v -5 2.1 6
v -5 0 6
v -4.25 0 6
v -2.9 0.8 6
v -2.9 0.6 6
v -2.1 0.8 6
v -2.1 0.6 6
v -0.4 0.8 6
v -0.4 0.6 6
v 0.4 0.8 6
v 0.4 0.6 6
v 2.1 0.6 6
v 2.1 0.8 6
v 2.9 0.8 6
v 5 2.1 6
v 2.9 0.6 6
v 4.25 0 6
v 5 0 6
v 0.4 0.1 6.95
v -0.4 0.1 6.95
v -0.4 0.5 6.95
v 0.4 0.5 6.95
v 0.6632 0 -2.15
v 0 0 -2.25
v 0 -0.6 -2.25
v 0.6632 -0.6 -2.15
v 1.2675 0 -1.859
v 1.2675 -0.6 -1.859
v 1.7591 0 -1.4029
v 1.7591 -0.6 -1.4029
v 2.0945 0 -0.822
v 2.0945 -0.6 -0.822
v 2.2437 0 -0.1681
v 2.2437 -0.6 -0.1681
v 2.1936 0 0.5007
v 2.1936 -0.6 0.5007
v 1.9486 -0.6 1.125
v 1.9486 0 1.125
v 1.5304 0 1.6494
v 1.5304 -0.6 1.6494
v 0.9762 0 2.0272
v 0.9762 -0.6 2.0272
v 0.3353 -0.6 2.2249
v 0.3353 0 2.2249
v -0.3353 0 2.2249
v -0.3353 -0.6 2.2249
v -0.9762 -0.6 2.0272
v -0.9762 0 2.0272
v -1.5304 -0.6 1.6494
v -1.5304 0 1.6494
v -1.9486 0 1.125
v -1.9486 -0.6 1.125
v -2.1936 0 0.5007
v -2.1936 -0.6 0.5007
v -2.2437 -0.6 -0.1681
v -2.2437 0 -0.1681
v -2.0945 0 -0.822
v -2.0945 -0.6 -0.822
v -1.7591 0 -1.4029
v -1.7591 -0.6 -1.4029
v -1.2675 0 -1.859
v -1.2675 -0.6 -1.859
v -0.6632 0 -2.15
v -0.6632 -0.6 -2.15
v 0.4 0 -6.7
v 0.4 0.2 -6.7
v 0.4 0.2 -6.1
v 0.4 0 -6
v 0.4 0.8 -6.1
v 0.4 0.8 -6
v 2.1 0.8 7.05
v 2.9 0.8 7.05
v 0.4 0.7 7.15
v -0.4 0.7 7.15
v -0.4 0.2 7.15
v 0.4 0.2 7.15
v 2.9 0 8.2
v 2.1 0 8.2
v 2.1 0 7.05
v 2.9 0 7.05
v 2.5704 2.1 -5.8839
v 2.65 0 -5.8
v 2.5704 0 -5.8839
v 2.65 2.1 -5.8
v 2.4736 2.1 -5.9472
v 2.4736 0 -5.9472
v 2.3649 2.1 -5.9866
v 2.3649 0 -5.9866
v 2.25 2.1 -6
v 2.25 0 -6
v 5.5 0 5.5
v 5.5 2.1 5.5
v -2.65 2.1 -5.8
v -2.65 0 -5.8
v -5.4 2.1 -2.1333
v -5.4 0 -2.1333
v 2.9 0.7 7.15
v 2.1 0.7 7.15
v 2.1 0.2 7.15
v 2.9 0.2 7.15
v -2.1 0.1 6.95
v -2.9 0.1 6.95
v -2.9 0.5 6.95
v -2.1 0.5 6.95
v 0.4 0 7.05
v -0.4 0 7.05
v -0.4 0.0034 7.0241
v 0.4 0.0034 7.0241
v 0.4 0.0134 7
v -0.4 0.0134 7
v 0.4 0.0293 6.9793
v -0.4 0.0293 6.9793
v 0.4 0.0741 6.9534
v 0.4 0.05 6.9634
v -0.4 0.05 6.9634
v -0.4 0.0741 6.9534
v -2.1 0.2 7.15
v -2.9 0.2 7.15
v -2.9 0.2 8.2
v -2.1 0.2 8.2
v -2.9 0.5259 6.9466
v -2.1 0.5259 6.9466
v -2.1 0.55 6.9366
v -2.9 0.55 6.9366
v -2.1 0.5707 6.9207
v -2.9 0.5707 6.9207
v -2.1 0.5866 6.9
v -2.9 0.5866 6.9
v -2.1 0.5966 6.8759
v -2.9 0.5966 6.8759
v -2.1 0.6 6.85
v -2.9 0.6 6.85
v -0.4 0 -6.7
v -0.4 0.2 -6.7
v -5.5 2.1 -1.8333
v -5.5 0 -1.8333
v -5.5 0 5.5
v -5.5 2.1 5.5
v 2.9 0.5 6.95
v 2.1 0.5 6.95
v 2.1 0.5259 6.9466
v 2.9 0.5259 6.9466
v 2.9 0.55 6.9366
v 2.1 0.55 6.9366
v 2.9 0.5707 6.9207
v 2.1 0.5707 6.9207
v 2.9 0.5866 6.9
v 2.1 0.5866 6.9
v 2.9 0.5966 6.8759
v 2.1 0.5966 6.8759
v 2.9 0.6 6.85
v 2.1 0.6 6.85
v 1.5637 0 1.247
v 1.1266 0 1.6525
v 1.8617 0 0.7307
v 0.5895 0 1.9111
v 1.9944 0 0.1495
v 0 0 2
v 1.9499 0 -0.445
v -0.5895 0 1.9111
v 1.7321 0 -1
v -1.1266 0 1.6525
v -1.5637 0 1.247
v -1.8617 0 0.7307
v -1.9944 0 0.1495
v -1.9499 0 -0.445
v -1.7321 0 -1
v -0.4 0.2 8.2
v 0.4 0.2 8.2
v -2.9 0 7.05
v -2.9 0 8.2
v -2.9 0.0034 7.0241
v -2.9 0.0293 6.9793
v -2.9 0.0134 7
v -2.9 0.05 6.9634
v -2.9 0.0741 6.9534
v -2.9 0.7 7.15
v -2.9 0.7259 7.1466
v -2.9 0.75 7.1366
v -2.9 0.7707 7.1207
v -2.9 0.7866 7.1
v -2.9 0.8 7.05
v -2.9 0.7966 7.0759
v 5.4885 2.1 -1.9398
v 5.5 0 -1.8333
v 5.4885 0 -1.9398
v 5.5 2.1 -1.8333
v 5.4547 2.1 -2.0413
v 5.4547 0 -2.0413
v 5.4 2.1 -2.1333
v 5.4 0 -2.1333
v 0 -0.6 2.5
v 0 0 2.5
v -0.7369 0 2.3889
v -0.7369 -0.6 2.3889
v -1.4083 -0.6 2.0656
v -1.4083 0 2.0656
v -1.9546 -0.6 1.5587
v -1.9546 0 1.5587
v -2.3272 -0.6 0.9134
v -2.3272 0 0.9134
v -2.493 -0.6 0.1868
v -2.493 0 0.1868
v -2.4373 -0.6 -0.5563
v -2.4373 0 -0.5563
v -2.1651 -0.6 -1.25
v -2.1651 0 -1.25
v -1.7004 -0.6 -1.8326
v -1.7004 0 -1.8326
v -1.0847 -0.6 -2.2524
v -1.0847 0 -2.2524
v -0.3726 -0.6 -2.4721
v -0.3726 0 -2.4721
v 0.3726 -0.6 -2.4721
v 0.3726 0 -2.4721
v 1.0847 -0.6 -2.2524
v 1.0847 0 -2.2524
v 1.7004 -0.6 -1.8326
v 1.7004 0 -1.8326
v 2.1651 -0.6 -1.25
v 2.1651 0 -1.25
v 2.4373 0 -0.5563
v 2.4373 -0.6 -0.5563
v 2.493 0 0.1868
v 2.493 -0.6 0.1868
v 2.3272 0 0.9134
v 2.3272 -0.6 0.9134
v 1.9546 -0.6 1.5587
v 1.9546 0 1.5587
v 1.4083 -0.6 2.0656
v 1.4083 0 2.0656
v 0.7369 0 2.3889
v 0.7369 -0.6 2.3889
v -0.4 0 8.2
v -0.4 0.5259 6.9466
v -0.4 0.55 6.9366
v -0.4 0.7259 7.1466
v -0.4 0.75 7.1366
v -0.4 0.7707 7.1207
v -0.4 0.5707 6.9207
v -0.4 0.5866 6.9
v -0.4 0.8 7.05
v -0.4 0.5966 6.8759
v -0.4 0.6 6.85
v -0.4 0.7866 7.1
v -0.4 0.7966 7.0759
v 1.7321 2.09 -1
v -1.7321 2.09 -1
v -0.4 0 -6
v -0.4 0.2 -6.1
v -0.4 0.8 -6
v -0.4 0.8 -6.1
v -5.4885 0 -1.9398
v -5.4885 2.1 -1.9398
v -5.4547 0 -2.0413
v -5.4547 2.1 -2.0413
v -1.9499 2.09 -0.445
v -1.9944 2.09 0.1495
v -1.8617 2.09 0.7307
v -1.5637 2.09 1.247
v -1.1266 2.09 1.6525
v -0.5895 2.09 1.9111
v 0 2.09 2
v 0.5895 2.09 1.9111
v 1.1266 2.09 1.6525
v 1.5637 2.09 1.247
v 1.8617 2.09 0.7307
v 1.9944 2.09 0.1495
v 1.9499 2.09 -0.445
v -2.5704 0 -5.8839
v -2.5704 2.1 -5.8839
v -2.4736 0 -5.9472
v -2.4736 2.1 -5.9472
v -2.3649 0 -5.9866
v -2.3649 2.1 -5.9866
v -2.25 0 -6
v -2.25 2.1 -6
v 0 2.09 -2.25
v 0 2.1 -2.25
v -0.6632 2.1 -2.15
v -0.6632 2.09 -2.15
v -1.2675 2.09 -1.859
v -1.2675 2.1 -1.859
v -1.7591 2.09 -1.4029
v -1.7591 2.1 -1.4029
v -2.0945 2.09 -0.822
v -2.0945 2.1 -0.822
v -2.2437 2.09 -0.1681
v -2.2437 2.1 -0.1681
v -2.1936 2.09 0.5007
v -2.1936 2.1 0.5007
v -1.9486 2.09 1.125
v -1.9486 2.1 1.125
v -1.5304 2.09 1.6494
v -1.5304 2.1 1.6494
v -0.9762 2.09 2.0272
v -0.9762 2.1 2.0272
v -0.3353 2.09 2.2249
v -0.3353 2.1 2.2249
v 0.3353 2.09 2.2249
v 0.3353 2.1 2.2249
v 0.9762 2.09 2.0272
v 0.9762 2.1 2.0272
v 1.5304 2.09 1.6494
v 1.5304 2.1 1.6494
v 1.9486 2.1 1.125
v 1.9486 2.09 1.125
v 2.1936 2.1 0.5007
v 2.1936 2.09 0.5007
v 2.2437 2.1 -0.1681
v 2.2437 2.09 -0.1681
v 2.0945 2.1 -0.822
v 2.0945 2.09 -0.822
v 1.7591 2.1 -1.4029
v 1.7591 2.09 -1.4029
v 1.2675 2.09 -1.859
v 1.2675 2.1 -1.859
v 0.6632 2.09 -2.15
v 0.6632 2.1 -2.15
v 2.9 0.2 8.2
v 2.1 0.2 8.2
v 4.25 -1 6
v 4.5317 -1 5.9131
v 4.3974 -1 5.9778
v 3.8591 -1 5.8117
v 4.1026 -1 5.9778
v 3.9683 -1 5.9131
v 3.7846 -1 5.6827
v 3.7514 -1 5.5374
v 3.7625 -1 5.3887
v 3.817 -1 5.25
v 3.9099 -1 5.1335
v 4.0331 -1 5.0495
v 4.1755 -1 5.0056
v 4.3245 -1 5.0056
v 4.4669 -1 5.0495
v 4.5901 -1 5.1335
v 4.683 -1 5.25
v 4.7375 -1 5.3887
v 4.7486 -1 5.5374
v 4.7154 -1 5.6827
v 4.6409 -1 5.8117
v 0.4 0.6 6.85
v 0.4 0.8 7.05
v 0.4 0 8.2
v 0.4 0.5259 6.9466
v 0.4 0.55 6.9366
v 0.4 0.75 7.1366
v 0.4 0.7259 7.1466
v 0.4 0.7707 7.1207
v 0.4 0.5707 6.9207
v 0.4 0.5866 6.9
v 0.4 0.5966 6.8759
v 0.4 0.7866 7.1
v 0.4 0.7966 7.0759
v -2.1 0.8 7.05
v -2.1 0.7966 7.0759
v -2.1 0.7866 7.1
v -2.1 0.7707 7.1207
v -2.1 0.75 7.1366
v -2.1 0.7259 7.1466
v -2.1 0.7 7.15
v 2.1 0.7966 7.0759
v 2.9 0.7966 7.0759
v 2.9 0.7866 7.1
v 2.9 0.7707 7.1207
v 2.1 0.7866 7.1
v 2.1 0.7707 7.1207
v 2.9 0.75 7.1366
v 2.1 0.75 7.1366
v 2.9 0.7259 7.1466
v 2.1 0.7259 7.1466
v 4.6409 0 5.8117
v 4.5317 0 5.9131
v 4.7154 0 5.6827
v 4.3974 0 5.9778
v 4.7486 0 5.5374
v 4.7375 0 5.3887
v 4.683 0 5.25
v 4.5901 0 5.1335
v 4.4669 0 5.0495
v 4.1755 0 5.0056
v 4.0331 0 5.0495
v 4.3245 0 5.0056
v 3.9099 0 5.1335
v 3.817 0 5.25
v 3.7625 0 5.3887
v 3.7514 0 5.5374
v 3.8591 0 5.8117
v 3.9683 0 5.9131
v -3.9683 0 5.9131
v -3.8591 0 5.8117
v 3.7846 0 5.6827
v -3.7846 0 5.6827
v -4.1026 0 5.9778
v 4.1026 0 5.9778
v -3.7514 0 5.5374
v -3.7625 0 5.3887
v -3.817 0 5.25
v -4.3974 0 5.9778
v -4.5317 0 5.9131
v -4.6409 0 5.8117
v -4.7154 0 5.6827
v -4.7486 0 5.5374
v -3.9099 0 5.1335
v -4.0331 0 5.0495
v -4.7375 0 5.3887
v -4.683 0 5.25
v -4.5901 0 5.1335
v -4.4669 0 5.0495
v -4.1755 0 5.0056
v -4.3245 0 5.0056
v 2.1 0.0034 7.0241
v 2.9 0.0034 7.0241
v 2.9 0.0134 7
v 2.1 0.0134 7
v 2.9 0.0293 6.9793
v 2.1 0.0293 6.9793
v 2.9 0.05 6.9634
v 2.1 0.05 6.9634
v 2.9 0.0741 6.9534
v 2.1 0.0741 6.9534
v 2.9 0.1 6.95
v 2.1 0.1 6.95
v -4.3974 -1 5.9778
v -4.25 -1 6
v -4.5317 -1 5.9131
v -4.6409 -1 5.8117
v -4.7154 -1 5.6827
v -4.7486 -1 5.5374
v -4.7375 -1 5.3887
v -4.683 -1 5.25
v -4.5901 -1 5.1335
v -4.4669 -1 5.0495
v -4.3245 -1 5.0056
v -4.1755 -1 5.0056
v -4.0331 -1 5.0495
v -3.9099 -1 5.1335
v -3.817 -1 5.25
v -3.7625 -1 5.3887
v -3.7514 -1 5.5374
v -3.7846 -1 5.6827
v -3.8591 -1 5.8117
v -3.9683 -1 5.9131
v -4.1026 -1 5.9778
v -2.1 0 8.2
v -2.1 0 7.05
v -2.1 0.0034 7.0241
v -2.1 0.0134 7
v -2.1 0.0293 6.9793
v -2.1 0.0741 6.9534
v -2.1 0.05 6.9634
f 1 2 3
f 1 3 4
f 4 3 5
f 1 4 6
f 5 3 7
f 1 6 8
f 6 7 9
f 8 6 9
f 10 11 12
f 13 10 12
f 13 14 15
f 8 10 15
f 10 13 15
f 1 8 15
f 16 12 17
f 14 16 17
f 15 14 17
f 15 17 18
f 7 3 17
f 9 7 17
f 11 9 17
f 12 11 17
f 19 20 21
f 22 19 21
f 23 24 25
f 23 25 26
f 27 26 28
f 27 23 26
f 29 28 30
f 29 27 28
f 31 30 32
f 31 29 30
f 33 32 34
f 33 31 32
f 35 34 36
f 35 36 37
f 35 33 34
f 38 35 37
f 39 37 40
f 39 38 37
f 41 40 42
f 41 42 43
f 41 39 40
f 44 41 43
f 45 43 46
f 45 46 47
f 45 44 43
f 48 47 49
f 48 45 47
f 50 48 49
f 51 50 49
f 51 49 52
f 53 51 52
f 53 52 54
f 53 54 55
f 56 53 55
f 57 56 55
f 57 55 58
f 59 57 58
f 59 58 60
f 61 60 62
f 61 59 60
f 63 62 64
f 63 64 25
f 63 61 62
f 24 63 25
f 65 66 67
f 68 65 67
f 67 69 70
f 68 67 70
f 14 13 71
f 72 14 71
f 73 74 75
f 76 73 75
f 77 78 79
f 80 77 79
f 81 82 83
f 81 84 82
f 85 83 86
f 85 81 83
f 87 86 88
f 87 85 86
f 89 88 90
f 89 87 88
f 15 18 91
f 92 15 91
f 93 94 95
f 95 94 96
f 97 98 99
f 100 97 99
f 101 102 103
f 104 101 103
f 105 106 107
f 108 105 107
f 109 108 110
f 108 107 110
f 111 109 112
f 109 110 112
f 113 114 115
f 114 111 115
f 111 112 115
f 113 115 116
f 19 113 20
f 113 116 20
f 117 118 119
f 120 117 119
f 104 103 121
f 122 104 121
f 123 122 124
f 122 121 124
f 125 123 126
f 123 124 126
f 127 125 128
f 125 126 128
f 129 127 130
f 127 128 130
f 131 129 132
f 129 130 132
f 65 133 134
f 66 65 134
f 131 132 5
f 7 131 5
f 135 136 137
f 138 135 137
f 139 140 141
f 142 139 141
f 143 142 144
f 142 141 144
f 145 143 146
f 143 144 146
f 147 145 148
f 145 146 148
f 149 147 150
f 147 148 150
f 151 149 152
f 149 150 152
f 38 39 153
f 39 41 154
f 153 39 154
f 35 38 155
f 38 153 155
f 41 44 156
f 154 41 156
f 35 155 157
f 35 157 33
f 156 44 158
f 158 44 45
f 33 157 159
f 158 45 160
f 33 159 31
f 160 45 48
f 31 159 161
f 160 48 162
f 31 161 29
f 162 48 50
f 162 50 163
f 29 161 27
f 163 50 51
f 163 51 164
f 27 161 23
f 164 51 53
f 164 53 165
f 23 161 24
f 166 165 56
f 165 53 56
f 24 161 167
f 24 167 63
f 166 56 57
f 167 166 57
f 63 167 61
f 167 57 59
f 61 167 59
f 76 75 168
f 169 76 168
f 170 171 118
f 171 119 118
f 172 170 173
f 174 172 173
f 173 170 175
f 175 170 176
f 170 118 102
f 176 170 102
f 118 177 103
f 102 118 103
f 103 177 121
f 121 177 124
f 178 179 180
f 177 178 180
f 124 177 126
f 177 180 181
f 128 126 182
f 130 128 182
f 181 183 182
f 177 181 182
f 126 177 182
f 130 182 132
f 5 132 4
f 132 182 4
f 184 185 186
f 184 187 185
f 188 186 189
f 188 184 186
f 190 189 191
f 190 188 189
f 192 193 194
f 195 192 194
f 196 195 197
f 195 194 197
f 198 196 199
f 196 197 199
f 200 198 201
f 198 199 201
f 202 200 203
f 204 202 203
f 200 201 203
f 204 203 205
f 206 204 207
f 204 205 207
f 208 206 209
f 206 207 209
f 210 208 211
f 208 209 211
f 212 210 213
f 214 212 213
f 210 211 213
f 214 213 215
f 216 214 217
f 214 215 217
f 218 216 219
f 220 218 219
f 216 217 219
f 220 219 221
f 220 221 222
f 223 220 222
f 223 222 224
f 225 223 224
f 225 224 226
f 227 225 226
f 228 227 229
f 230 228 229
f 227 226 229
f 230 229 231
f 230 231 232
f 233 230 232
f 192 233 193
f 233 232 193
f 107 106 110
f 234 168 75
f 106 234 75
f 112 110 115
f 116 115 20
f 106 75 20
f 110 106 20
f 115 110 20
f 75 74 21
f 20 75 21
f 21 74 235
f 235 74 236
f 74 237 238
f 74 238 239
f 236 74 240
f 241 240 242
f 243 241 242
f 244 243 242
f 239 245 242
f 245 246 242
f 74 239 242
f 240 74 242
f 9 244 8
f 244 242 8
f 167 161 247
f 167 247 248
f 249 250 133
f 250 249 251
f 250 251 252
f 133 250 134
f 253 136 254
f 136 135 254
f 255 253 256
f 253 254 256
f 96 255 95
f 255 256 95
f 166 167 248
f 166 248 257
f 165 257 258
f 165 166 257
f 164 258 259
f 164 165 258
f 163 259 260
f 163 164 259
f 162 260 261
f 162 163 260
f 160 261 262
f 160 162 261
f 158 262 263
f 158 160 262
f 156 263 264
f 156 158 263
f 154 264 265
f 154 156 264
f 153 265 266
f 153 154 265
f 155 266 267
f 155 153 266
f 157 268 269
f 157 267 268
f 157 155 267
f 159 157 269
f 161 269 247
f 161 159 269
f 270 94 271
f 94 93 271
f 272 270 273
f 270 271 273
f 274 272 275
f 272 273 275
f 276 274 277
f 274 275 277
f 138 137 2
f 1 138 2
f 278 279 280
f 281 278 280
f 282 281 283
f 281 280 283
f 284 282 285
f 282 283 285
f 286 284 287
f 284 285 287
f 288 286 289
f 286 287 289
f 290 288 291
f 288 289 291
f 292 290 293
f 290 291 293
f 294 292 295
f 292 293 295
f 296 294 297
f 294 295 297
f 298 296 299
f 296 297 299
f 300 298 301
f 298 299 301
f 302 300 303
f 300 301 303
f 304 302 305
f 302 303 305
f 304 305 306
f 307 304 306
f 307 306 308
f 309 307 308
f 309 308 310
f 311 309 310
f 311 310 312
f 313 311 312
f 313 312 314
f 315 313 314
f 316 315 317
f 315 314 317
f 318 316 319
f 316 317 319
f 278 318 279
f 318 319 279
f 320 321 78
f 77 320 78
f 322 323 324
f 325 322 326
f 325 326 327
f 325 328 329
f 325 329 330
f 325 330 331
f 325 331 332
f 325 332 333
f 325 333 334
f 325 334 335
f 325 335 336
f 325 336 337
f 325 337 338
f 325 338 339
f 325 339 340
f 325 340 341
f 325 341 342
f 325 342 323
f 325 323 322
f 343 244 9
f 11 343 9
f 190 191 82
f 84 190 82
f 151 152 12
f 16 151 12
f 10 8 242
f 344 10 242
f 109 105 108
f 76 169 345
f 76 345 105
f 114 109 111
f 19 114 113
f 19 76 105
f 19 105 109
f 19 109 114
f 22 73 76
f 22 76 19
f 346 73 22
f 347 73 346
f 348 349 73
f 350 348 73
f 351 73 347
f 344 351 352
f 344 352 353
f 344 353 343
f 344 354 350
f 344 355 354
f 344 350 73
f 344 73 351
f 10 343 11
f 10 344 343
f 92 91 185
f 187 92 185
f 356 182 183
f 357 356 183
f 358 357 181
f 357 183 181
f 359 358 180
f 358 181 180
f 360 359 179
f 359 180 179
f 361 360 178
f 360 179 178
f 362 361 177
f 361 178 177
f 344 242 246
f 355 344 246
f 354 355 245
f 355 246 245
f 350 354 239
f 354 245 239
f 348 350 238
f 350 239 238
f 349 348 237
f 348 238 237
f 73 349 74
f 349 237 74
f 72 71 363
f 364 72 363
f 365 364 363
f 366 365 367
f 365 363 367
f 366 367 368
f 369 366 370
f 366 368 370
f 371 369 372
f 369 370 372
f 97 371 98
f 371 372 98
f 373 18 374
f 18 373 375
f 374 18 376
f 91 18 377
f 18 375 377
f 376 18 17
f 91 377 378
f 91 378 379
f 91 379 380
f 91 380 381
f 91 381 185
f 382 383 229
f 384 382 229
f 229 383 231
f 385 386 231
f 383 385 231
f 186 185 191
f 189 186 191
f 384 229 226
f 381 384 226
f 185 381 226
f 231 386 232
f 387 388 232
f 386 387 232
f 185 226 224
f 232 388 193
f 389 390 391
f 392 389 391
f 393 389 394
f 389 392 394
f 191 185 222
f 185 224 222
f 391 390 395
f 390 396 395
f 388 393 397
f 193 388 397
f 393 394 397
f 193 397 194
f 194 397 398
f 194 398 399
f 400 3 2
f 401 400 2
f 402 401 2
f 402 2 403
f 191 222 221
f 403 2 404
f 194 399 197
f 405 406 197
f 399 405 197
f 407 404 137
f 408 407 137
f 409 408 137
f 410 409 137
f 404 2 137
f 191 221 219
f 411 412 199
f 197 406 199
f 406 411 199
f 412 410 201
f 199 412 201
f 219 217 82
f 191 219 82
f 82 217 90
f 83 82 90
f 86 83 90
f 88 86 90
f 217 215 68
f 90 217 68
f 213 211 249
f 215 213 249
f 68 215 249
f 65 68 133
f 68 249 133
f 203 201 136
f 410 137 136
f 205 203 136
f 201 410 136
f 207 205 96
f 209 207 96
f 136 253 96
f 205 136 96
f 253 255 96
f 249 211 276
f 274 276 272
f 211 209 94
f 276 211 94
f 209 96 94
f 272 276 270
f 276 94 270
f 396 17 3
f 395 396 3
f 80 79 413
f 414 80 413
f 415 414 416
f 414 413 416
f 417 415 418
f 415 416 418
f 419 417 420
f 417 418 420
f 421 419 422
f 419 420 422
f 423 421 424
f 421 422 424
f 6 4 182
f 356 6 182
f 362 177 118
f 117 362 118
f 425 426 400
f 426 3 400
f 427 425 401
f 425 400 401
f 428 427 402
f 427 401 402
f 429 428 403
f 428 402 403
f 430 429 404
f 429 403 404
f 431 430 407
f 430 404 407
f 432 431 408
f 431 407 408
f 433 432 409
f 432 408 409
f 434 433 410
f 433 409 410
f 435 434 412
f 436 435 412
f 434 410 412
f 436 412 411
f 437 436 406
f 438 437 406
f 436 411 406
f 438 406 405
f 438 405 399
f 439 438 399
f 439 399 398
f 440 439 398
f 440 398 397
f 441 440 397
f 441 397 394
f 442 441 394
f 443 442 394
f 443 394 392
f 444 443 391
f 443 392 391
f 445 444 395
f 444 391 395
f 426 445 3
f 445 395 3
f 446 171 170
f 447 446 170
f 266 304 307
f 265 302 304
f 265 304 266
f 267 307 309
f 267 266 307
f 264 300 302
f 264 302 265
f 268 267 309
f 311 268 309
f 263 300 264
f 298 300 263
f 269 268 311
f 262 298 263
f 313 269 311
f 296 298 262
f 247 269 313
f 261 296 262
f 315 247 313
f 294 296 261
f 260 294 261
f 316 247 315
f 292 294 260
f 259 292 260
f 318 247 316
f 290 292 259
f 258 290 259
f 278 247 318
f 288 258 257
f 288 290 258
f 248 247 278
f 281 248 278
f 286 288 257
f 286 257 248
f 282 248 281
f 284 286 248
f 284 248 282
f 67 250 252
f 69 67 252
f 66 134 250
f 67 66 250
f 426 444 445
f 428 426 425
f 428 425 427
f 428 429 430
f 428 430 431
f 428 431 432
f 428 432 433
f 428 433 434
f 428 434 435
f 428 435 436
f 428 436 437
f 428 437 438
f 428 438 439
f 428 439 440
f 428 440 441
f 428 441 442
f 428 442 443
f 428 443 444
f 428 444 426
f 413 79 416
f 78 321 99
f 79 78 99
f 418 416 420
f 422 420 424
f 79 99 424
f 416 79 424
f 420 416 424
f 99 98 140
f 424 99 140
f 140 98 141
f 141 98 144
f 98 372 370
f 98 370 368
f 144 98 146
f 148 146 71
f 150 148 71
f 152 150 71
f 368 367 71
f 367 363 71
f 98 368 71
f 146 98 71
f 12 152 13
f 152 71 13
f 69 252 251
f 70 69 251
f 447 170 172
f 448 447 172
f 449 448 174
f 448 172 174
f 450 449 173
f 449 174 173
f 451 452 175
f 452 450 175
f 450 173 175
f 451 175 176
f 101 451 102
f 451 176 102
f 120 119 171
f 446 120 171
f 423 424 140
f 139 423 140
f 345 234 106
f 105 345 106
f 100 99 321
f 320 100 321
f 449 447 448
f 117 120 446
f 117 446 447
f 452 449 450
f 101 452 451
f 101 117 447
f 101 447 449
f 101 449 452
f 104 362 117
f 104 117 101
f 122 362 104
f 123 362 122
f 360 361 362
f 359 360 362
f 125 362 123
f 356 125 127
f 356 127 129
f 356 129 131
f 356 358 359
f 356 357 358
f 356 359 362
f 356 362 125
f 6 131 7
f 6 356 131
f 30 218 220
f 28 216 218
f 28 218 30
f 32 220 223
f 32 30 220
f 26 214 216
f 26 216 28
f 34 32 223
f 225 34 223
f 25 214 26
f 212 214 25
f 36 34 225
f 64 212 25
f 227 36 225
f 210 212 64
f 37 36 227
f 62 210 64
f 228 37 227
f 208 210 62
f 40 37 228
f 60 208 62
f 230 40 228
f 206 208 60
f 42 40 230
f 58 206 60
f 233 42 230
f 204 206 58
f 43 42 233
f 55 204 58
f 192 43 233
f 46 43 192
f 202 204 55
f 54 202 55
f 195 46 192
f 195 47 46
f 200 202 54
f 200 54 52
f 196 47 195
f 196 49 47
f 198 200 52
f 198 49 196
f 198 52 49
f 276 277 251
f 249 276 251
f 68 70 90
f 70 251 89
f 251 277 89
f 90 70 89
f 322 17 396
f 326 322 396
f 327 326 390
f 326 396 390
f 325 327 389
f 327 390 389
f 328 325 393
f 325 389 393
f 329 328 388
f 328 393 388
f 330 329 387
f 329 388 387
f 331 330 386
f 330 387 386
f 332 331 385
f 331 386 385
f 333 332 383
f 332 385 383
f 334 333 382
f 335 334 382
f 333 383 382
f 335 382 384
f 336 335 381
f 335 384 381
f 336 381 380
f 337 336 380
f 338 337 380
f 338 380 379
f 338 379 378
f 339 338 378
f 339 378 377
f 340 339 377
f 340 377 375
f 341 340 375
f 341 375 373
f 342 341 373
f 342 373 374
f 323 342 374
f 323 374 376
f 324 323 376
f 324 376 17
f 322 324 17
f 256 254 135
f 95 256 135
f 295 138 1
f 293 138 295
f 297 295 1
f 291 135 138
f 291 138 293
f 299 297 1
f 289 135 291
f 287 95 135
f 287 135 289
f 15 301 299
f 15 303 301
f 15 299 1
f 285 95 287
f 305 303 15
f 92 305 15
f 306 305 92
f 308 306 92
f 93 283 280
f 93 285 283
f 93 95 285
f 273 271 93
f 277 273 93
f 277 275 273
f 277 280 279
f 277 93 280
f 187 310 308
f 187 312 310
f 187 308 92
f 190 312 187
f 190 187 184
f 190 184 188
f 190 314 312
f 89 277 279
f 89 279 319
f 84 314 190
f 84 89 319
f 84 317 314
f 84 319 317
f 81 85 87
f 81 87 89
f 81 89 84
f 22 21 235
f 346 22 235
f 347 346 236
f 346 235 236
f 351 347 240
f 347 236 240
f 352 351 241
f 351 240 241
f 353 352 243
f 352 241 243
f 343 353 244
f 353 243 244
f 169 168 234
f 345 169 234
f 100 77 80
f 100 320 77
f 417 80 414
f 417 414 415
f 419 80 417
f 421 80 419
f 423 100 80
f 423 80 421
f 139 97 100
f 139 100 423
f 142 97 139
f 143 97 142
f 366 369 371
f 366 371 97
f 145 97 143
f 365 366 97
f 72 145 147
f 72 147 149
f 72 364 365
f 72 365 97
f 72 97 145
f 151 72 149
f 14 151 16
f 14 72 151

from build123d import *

# Parameters (mm, degrees)
SKETCH1_R                = 2.5
FORMABASE_DEPTH          = 2.1
FILLET1_R                = 0.5
BOSS_EXTRUDE2_DEPTH      = 2.9
BOSS_EXTRUDE2_DEPTH_BACK = 2.9
BOSS_EXTRUDE2_START      = -5.5
SKETCH3_W                = 1.7
SKETCH3_H                = 2.2
CUT_EXTRUDE1_DEPTH       = 11.094552987
SKETCH4_R                = 2.5
SKETCH4_R_2              = 2.25
SKETCH4_R_3              = 0.5
BOSS_EXTRUDE3_DEPTH      = 0.6
SKETCH5_R                = 0.5
BOSS_EXTRUDE4_DEPTH      = 0.4
SKETCH6_R                = 2.25
CUT_EXTRUDE2_DEPTH       = 0.01


with BuildPart() as part:
    # Sketch1 → FormaBase (new body)
    # profile 1 of 2: a face of its own
    with BuildSketch(Plane(origin=(0, 0, 0), x_dir=(1, 0, 0), z_dir=(0, 1, 0))):
        Polygon((-5, -6), (5, -6), (5.5, -5.5), (5.5, 2), (2.5, 6), (-2.5, 6), (-5.5, 2), (-5.5, -5.5), align=None)
        Circle(SKETCH1_R, mode=Mode.SUBTRACT)
    # profile 2 of 2: a face of its own
    with BuildSketch(Plane(origin=(0, 0, 0), x_dir=(1, 0, 0), z_dir=(0, 1, 0))):
        Circle(SKETCH1_R)
        with BuildLine():
            ThreePointArc((-1.732050808, 1), (0, -2), (1.732050808, 1))
            Line((1.732050808, 1), (-1.732050808, 1))
        make_face(mode=Mode.SUBTRACT)
    extrude(amount=FORMABASE_DEPTH)

    # Fillet1
    fillet1_edges = [part.edges().sort_by_distance(p)[0] for p in [
        (-5.5, 1.05, -2),
        (-2.5, 1.05, -6),
        (2.5, 1.05, -6),
        (5.5, 1.05, -2),
    ]]
    fillet(fillet1_edges, radius=FILLET1_R)

    # Sketch2 → Boss-Extrude2 (add, two sides: drawn at the far end of the back side and taken through both)
    with BuildSketch(Plane(origin=(5.5, 0, 0), x_dir=(0, 0, -1), z_dir=(1, 0, 0)).offset(BOSS_EXTRUDE2_START - BOSS_EXTRUDE2_DEPTH_BACK)):
        with BuildLine():
            Line((-8.2, 0), (-7.05, 0))
            ThreePointArc((-7.05, 0), (-6.979289322, 0.029289322), (-6.95, 0.1))
            Line((-6.95, 0.1), (-6.95, 0.5))
            ThreePointArc((-6.95, 0.5), (-6.920710678, 0.570710678), (-6.85, 0.6))
            Line((-6.85, 0.6), (-6, 0.6))
            Line((-6, 0.6), (-6, 0.8))
            Line((-6, 0.8), (-7.05, 0.8))
            ThreePointArc((-7.05, 0.8), (-7.120710678, 0.770710678), (-7.15, 0.7))
            Line((-7.15, 0.7), (-7.15, 0.2))
            Line((-7.15, 0.2), (-8.2, 0.2))
            Line((-8.2, 0.2), (-8.2, 0))
        make_face()
        Polygon((6, 0.8), (6, 0), (6.7, 0), (6.7, 0.2), (6.1, 0.2), (6.1, 0.8), align=None)
    extrude(amount=BOSS_EXTRUDE2_DEPTH + BOSS_EXTRUDE2_DEPTH_BACK)

    # Sketch3 → Cut-Extrude1 (cut, through all)
    with BuildSketch(Plane(origin=(0, 2.1, 0), x_dir=(1, 0, 0), z_dir=(0, 1, 0))):
        with Locations((-1.25, -7.1)):
            Rectangle(SKETCH3_W, SKETCH3_H)
        with Locations((1.25, -7.1)):
            Rectangle(SKETCH3_W, SKETCH3_H)
        Polygon((-2.1, 6), (-0.4, 6), (-0.4, 6.7), (-2.9, 6.7), (-2.9, 6), (-2.25, 6), align=None)
        Polygon((0.4, 6.7), (0.4, 6), (2.1, 6), (2.25, 6), (2.9, 6), (2.9, 6.7), align=None)
    extrude(amount=-CUT_EXTRUDE1_DEPTH, mode=Mode.SUBTRACT)

    # Sketch4 → Boss-Extrude3 (add)
    # profile 1 of 3: a face of its own
    with BuildSketch(Plane.XZ):
        with Locations(Location((0, 0, 0), (0, 0, 90))):
            Circle(SKETCH4_R)
        with Locations(Location((0, 0, 0), (0, 0, 270))):
            Circle(SKETCH4_R_2, mode=Mode.SUBTRACT)
    # profile 2 of 3: a face of its own
    with BuildSketch(Plane.XZ):
        with Locations(Location((4.25, 5.5, 0), (0, 0, 90))):
            Circle(SKETCH4_R_3)
    # profile 3 of 3: a face of its own
    with BuildSketch(Plane.XZ):
        with Locations(Location((-4.25, 5.5, 0), (0, 0, 90))):
            Circle(SKETCH4_R_3)
    extrude(amount=BOSS_EXTRUDE3_DEPTH)

    # Sketch5 → Boss-Extrude4 (add)
    with BuildSketch(Plane.XZ.offset(0.6)):
        with Locations(Location((-4.25, 5.5, 0), (0, 0, 90))):
            Circle(SKETCH5_R)
        with Locations(Location((4.25, 5.5, 0), (0, 0, 90))):
            Circle(SKETCH5_R)
    extrude(amount=BOSS_EXTRUDE4_DEPTH)

    # Sketch6 → Cut-Extrude2 (cut)
    with BuildSketch(Plane(origin=(0, 2.1, 0), x_dir=(1, 0, 0), z_dir=(0, 1, 0))):
        with Locations(Location((0, 0, 0), (0, 0, 90))):
            Circle(SKETCH6_R)
    extrude(amount=-CUT_EXTRUDE2_DEPTH, mode=Mode.SUBTRACT)


solid = part.part
